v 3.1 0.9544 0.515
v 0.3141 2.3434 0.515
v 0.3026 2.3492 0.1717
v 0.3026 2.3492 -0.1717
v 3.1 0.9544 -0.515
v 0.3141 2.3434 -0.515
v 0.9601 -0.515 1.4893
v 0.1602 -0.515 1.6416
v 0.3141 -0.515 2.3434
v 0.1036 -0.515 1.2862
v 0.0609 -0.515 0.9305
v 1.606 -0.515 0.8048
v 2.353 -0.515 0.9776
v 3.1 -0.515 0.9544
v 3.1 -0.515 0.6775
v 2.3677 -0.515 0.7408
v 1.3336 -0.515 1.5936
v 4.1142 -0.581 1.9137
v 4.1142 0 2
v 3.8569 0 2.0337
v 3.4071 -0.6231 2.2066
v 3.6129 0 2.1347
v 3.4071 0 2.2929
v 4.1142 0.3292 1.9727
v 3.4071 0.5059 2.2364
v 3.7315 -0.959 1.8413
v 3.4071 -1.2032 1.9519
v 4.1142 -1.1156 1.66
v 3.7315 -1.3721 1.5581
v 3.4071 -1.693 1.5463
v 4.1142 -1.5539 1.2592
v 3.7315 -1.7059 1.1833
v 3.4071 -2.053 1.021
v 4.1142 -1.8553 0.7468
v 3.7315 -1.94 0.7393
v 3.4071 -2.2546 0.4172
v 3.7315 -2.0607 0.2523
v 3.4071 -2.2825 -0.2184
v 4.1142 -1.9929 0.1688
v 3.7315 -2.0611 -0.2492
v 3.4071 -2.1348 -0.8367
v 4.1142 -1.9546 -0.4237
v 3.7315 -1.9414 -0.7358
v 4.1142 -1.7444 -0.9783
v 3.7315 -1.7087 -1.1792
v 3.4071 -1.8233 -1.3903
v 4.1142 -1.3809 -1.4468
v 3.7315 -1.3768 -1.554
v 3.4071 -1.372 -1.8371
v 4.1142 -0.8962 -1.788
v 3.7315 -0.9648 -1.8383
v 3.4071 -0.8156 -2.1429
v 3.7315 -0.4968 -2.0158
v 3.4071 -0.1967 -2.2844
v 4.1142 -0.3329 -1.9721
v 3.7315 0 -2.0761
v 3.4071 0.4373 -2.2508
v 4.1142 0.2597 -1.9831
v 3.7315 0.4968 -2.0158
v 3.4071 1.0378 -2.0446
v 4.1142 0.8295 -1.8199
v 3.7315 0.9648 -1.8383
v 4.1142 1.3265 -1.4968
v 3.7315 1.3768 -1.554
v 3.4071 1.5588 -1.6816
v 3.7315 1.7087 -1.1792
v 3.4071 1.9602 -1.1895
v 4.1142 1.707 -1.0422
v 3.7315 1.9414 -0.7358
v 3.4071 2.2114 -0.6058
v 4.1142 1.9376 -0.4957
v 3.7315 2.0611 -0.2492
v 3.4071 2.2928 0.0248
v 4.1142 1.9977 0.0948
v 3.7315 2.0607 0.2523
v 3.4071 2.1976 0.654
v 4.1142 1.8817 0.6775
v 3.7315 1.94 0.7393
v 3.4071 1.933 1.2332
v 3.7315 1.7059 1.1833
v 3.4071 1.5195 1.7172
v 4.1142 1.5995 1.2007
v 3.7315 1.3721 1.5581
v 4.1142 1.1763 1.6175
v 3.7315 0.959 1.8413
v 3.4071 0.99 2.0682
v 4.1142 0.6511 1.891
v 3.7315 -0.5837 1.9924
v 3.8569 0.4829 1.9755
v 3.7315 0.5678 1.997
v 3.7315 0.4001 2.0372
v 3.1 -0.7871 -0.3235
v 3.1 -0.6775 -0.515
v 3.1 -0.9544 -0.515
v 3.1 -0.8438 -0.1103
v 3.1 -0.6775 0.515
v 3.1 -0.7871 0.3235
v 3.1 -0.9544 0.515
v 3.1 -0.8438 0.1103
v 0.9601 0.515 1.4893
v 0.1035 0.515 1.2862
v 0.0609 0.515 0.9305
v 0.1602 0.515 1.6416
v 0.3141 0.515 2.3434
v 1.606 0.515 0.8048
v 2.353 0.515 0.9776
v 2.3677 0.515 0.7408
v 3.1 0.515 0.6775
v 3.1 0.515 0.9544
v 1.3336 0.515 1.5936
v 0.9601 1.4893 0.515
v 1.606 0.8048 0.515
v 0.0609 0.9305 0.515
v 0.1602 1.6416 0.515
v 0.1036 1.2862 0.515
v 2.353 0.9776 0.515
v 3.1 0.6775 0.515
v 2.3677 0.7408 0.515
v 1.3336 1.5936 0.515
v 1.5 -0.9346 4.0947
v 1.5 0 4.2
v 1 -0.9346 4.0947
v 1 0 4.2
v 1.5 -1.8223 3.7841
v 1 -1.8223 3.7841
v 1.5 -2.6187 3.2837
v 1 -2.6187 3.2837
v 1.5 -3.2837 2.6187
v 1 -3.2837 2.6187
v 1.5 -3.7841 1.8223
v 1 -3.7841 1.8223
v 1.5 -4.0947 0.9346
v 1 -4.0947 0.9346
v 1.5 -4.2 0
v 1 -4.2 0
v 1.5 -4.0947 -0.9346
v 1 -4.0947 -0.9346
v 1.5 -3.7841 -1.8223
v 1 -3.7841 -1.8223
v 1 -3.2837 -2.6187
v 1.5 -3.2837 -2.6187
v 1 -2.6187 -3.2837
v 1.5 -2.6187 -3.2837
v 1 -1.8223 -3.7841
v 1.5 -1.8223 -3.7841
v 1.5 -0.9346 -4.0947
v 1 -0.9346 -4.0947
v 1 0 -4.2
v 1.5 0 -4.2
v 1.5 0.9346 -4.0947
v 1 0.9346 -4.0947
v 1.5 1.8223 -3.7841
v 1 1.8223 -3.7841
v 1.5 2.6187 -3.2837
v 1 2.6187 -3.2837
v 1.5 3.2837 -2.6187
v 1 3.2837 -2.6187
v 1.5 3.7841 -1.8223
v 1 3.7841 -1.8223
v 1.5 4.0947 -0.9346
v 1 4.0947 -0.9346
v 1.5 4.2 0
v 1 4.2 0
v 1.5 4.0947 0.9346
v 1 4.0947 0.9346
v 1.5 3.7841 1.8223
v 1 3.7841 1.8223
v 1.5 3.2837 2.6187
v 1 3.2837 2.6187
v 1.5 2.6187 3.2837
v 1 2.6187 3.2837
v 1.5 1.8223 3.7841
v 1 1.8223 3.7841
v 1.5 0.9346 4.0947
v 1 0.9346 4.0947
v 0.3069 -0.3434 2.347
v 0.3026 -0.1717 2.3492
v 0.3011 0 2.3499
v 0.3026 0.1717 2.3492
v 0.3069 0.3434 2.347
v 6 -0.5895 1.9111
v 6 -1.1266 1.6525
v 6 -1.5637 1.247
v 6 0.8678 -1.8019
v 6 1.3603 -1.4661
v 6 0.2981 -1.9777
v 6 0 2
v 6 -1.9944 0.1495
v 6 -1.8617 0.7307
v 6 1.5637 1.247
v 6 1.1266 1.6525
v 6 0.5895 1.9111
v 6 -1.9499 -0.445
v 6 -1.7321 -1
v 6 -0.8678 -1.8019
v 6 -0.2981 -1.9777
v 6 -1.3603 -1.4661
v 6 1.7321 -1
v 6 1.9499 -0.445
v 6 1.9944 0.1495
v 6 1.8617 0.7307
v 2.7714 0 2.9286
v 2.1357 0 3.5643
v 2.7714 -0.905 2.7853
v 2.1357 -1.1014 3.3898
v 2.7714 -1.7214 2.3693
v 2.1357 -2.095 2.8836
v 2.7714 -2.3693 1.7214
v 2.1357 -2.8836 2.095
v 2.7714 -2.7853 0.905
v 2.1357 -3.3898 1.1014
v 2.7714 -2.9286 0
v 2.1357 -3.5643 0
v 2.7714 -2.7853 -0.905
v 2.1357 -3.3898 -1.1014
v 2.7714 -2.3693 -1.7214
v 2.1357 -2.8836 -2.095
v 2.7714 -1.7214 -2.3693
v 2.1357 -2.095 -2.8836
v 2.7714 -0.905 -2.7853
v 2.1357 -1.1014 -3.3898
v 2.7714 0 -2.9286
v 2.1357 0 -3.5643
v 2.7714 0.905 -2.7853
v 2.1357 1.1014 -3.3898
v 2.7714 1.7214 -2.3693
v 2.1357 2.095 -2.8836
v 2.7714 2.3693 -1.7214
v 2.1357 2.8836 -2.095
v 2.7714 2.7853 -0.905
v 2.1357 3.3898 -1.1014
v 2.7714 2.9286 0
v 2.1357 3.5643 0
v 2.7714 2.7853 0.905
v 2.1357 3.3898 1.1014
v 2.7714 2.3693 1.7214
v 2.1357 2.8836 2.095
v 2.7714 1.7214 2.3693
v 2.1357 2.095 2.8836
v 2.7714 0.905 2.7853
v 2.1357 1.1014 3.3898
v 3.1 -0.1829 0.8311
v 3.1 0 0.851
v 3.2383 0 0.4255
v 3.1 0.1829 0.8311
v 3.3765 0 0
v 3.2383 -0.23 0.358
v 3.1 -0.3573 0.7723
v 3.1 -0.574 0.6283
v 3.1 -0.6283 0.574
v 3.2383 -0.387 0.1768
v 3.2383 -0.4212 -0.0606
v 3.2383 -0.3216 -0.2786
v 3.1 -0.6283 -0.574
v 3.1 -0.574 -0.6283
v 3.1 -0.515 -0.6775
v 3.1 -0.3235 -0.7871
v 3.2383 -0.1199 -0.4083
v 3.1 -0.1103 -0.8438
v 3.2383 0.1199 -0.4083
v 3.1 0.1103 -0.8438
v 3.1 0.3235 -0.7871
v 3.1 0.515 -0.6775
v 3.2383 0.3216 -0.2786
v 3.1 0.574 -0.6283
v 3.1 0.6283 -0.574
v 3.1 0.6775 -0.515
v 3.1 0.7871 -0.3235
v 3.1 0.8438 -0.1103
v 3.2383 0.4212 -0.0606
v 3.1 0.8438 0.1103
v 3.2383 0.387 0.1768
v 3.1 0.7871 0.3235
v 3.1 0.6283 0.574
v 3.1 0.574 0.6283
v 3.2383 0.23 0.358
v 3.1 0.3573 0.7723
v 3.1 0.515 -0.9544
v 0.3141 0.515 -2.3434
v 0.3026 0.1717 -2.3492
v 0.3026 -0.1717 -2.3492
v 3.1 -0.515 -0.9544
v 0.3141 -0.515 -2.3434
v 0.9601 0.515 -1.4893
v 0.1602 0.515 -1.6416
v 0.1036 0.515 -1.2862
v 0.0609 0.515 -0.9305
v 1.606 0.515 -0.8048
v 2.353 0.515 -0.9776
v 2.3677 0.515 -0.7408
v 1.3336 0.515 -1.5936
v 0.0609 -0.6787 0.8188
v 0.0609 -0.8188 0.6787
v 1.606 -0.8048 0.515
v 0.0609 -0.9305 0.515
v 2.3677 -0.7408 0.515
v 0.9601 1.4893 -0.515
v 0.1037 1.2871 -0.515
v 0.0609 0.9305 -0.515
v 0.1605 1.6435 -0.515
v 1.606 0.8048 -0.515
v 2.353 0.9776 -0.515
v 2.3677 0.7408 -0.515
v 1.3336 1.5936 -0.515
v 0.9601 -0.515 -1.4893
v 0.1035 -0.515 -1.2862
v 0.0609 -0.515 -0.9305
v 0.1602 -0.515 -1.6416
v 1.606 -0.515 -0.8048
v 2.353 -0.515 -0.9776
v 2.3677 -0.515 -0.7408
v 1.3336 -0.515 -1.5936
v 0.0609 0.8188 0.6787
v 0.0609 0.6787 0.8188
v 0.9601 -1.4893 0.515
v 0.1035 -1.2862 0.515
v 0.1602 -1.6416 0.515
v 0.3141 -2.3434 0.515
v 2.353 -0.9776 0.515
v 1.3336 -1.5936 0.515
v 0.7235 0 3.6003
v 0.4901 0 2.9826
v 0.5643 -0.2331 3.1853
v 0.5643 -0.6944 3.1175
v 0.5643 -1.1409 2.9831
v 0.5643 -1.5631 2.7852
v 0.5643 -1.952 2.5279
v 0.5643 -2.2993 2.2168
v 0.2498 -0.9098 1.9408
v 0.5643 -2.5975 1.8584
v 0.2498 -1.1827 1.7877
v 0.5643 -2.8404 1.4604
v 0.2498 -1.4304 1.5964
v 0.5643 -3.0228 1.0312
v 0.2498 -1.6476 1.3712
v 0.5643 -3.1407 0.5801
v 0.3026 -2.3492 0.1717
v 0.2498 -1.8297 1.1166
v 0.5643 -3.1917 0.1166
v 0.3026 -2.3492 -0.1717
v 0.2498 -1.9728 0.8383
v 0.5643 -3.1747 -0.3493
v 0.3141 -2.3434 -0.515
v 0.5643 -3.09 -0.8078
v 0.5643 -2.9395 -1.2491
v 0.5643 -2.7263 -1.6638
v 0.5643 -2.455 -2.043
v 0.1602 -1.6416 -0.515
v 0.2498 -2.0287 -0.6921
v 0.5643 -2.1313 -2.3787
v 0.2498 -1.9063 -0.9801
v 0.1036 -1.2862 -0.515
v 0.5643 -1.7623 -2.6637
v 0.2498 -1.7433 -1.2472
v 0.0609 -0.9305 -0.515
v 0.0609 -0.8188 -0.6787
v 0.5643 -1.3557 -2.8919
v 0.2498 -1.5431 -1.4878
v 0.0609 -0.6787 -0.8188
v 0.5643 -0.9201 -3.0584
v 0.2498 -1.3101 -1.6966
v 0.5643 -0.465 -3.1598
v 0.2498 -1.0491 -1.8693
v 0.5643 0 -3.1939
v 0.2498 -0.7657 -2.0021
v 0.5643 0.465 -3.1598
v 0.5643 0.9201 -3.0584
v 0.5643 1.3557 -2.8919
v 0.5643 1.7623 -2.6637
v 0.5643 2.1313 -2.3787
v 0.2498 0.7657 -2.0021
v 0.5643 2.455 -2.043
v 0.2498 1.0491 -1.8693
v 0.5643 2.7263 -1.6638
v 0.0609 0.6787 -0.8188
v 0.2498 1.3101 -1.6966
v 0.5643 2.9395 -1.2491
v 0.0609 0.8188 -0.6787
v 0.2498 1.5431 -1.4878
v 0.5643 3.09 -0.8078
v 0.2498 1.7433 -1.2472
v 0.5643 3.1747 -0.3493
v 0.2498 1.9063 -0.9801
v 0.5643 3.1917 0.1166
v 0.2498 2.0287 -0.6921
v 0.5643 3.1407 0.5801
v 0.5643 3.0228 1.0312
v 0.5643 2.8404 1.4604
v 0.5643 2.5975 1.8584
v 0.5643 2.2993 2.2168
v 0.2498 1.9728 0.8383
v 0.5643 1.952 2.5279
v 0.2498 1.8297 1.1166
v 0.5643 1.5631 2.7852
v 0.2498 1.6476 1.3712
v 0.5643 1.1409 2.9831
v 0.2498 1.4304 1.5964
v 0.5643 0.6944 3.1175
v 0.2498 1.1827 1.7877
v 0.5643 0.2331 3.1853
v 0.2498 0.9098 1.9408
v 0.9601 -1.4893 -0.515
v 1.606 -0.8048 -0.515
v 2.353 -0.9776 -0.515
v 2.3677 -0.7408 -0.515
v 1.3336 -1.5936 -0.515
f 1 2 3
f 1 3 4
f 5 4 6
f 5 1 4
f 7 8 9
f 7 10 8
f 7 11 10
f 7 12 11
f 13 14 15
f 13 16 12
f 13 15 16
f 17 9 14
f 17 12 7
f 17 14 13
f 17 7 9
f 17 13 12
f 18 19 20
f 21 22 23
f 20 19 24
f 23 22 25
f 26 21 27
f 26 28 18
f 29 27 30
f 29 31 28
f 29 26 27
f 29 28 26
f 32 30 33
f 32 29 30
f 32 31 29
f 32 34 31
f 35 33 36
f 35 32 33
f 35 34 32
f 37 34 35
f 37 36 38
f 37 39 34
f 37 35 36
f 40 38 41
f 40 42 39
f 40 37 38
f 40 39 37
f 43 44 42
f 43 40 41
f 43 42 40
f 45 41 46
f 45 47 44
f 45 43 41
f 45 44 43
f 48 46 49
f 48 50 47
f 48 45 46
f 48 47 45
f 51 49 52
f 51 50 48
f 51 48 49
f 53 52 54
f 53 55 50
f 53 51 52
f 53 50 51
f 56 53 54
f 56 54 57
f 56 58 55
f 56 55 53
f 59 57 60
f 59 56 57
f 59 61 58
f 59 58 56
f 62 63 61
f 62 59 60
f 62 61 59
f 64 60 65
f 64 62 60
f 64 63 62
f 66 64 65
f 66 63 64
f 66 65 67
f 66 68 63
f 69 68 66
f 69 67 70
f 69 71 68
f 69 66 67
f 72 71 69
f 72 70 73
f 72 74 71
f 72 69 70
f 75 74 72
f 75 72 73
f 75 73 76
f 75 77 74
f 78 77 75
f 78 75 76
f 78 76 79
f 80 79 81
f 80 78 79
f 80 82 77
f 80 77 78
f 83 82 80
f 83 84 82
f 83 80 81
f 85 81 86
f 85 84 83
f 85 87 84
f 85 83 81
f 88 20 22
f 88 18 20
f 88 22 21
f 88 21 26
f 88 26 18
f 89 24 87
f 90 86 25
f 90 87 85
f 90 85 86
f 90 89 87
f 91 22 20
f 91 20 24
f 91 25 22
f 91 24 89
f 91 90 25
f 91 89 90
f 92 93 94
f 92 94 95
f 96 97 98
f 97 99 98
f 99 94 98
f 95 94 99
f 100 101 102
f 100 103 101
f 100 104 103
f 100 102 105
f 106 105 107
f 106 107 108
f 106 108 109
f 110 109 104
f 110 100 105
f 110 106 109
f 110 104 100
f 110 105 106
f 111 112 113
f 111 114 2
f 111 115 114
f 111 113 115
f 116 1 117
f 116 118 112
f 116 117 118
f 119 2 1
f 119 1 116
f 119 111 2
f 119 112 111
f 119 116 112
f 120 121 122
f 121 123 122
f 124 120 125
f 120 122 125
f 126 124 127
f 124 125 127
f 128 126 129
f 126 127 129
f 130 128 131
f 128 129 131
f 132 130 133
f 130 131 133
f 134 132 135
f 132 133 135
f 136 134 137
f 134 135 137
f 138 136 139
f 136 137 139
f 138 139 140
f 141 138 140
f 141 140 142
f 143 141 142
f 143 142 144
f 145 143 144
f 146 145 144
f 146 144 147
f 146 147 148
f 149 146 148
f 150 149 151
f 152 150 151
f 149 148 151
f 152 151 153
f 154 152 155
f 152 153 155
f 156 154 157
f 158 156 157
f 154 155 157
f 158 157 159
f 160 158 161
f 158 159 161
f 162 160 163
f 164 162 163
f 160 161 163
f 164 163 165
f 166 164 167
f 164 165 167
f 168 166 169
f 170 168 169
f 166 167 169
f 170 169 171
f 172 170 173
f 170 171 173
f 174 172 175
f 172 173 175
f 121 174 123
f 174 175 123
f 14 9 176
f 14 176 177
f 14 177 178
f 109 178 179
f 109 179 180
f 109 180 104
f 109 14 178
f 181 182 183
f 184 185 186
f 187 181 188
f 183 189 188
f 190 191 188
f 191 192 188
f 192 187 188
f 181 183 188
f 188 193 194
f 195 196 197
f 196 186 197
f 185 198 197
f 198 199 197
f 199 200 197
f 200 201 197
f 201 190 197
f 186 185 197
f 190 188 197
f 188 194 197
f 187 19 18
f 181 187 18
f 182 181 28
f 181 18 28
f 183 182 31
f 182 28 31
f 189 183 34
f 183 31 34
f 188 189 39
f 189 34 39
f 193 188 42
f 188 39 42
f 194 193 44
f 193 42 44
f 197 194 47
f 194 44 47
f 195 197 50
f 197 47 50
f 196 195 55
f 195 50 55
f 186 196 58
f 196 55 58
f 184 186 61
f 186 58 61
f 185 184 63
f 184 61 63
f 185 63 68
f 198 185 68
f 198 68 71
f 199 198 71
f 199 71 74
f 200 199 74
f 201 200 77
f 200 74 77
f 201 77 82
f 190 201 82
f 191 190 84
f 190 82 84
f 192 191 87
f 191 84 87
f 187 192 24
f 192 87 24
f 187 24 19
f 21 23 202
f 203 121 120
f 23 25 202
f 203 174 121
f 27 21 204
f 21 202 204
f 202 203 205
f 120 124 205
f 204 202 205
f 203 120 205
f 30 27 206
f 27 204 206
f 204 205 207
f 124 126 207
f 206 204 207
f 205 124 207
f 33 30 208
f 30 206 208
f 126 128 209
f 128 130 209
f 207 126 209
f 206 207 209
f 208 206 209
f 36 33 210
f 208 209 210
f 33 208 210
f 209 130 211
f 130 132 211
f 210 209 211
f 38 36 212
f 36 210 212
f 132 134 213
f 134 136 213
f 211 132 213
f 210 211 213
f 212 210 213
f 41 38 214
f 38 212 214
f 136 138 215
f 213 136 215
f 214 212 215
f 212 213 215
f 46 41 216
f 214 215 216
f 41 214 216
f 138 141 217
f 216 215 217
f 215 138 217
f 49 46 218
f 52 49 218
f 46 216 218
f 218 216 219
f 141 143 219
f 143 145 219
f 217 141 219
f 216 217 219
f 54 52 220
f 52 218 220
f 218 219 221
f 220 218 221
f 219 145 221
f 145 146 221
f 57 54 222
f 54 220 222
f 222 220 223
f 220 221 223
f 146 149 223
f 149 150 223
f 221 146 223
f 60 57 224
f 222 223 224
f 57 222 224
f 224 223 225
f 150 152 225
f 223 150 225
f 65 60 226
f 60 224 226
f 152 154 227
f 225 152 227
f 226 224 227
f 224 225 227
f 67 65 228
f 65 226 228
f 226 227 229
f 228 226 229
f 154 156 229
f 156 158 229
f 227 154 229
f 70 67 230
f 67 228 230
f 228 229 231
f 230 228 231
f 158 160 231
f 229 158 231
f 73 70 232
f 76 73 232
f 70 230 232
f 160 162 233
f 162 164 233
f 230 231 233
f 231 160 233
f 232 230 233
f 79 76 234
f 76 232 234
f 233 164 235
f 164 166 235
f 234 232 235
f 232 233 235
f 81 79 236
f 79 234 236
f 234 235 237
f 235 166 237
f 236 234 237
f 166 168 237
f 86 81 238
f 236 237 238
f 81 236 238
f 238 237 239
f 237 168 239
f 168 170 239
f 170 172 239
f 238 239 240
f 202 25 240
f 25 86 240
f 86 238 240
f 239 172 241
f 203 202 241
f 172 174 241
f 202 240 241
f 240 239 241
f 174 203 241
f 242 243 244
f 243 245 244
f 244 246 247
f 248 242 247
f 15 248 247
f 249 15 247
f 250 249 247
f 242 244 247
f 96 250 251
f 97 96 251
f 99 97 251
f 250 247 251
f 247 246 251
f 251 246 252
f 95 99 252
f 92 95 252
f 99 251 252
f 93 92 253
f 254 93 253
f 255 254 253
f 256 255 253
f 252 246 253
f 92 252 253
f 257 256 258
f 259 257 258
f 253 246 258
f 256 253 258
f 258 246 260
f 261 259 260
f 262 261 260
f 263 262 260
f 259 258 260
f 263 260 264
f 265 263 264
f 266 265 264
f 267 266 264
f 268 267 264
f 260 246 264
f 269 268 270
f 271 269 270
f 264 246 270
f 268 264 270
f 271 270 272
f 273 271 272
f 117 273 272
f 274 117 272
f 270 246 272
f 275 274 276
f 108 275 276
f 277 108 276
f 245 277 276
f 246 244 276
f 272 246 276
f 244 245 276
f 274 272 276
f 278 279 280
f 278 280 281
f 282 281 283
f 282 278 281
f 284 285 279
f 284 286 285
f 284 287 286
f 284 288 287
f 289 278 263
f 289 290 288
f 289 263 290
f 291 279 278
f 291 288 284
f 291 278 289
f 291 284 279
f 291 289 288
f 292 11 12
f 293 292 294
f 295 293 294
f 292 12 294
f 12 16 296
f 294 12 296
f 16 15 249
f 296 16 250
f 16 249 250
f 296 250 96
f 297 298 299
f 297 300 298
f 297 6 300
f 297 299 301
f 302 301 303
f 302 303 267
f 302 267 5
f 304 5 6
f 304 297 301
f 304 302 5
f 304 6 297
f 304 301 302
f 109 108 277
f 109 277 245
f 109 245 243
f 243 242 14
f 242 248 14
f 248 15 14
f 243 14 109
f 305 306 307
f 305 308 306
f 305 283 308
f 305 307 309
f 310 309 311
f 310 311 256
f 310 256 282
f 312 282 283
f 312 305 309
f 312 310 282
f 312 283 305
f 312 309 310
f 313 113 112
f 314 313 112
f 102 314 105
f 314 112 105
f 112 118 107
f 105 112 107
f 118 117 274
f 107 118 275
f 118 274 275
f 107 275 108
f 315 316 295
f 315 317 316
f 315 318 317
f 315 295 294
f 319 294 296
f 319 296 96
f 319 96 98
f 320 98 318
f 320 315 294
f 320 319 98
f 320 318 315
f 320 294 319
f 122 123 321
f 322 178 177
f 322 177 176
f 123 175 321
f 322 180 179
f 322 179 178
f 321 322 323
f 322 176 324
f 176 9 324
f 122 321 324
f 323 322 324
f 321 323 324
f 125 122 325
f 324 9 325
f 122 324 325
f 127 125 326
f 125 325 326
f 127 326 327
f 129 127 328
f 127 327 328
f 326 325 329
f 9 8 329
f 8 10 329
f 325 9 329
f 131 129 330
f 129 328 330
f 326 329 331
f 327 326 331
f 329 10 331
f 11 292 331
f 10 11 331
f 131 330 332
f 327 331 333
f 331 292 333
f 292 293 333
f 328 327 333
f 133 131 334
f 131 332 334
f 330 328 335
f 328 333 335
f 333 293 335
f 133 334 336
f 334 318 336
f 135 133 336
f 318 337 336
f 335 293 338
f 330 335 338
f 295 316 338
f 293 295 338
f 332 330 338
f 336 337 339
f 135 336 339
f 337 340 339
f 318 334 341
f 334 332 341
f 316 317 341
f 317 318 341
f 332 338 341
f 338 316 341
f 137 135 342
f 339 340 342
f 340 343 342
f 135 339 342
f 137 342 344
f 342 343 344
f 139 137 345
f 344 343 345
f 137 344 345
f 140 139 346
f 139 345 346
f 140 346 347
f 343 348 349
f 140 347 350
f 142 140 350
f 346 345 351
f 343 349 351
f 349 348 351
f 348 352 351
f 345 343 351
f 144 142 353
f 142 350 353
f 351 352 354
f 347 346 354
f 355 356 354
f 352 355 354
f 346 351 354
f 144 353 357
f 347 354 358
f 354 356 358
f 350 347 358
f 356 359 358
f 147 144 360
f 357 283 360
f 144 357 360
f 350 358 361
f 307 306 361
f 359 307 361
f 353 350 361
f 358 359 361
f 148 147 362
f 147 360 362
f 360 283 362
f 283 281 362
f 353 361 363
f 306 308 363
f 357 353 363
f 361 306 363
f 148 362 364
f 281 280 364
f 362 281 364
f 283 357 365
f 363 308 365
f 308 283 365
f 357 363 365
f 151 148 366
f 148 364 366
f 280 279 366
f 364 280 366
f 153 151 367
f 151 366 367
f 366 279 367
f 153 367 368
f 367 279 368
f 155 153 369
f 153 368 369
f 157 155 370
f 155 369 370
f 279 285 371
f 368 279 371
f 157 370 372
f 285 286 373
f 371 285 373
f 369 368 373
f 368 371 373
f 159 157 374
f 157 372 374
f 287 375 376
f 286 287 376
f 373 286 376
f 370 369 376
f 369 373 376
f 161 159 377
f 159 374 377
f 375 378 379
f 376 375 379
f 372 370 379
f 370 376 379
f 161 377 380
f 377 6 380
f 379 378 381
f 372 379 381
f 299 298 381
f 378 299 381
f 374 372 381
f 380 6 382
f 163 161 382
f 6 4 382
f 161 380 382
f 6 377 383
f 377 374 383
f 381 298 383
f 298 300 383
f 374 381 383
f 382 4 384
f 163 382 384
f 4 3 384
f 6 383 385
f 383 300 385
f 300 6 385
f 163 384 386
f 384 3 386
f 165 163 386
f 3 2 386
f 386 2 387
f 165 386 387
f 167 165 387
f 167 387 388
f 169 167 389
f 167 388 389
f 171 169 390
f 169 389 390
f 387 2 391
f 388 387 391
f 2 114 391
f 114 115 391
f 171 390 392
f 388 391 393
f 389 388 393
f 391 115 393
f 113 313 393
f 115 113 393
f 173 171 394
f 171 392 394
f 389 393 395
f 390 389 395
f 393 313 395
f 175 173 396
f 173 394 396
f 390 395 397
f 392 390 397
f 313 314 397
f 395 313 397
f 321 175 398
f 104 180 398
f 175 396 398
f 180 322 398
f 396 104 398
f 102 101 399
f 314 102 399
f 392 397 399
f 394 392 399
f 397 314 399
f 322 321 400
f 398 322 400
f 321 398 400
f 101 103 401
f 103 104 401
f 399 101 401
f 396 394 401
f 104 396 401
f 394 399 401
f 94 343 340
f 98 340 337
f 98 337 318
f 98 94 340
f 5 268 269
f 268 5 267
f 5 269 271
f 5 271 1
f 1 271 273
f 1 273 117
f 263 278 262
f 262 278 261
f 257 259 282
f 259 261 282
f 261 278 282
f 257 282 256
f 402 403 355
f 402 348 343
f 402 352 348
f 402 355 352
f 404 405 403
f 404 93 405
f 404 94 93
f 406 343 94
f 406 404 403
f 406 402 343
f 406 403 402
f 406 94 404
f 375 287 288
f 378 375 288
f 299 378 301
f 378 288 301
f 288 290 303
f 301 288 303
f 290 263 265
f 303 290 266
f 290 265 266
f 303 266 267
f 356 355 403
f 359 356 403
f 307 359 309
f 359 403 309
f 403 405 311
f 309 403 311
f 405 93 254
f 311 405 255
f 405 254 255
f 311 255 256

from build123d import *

# Parameters (mm, degrees)
FILLET1_R    = 1
RECPAT_COUNT = 2
RECPAT_ANGLE = 90


with BuildPart() as part:
    # BodySke → Base-Revolve (revolve)
    with BuildSketch(Plane.XY, mode=Mode.PRIVATE) as base_revolve_sk:
        with BuildLine():
            Line((0, 0), (6, 0))
            Line((6, 0), (6, 2))
            Line((6, 2), (3.7, 2))
            Line((3.7, 2), (1.5, 4.2))
            Line((1.5, 4.2), (1, 4.2))
            ThreePointArc((1, 4.2), (0.253446079, 2.158703314), (0, 0))
        make_face()
    revolve(base_revolve_sk.sketch.rotate(Axis((-15.875, 0, 0), (1, 0, 0)), 90), axis=Axis((-15.875, 0, 0), (1, 0, 0)))

    # Fillet1
    fillet1_edges = [part.edges().sort_by_distance(p)[0] for p in [
        (3.7, 0, -2),
    ]]
    fillet(fillet1_edges, radius=FILLET1_R)

    # Sketch3 → Recess section 0
    with BuildSketch(Plane(origin=(0, 0, 0), x_dir=(0, 0, -1), z_dir=(1, 0, 0))):
        with BuildLine():
            Line((0.515, -2.5), (-0.515, -2.5))
            Line((-0.515, -2.5), (-0.515, 2.5))
            Line((-0.515, 2.5), (0.515, 2.5))
            Line((0.515, 2.5), (0.515, -2.5))
        make_face()
    # Sketch4 → Recess section 1
    with BuildSketch(Plane(origin=(3.1, 0, 0), x_dir=(0, 0, -1), z_dir=(1, 0, 0))):
        with BuildLine():
            Line((0.515, -0.954397274), (-0.515, -0.954397274))
            Line((-0.515, -0.954397274), (-0.515, 0.954397274))
            Line((-0.515, 0.954397274), (0.515, 0.954397274))
            Line((0.515, 0.954397274), (0.515, -0.954397274))
        make_face()
    recess = loft(mode=Mode.SUBTRACT)

    # RecPat: Recess ×2 about axis
    recpat_axis = Axis((0, 0, 0), (1, 0, 0))
    for i in range(1, RECPAT_COUNT):
        add(recess.rotate(recpat_axis, i * RECPAT_ANGLE / (RECPAT_COUNT - 1)), mode=Mode.SUBTRACT)

    # RecCorSke → RecessCore (revolve, cut)
    with BuildSketch(Plane.XY, mode=Mode.PRIVATE) as recesscore_sk:
        Polygon((0, 0), (0, 1.067773117), (3.1, 0.851), (3.376506661, 0), align=None)
    revolve(recesscore_sk.sketch.rotate(Axis((-3.175, 0, 0), (1, 0, 0)), 90), axis=Axis((-3.175, 0, 0), (1, 0, 0)), mode=Mode.SUBTRACT)


solid = part.part
